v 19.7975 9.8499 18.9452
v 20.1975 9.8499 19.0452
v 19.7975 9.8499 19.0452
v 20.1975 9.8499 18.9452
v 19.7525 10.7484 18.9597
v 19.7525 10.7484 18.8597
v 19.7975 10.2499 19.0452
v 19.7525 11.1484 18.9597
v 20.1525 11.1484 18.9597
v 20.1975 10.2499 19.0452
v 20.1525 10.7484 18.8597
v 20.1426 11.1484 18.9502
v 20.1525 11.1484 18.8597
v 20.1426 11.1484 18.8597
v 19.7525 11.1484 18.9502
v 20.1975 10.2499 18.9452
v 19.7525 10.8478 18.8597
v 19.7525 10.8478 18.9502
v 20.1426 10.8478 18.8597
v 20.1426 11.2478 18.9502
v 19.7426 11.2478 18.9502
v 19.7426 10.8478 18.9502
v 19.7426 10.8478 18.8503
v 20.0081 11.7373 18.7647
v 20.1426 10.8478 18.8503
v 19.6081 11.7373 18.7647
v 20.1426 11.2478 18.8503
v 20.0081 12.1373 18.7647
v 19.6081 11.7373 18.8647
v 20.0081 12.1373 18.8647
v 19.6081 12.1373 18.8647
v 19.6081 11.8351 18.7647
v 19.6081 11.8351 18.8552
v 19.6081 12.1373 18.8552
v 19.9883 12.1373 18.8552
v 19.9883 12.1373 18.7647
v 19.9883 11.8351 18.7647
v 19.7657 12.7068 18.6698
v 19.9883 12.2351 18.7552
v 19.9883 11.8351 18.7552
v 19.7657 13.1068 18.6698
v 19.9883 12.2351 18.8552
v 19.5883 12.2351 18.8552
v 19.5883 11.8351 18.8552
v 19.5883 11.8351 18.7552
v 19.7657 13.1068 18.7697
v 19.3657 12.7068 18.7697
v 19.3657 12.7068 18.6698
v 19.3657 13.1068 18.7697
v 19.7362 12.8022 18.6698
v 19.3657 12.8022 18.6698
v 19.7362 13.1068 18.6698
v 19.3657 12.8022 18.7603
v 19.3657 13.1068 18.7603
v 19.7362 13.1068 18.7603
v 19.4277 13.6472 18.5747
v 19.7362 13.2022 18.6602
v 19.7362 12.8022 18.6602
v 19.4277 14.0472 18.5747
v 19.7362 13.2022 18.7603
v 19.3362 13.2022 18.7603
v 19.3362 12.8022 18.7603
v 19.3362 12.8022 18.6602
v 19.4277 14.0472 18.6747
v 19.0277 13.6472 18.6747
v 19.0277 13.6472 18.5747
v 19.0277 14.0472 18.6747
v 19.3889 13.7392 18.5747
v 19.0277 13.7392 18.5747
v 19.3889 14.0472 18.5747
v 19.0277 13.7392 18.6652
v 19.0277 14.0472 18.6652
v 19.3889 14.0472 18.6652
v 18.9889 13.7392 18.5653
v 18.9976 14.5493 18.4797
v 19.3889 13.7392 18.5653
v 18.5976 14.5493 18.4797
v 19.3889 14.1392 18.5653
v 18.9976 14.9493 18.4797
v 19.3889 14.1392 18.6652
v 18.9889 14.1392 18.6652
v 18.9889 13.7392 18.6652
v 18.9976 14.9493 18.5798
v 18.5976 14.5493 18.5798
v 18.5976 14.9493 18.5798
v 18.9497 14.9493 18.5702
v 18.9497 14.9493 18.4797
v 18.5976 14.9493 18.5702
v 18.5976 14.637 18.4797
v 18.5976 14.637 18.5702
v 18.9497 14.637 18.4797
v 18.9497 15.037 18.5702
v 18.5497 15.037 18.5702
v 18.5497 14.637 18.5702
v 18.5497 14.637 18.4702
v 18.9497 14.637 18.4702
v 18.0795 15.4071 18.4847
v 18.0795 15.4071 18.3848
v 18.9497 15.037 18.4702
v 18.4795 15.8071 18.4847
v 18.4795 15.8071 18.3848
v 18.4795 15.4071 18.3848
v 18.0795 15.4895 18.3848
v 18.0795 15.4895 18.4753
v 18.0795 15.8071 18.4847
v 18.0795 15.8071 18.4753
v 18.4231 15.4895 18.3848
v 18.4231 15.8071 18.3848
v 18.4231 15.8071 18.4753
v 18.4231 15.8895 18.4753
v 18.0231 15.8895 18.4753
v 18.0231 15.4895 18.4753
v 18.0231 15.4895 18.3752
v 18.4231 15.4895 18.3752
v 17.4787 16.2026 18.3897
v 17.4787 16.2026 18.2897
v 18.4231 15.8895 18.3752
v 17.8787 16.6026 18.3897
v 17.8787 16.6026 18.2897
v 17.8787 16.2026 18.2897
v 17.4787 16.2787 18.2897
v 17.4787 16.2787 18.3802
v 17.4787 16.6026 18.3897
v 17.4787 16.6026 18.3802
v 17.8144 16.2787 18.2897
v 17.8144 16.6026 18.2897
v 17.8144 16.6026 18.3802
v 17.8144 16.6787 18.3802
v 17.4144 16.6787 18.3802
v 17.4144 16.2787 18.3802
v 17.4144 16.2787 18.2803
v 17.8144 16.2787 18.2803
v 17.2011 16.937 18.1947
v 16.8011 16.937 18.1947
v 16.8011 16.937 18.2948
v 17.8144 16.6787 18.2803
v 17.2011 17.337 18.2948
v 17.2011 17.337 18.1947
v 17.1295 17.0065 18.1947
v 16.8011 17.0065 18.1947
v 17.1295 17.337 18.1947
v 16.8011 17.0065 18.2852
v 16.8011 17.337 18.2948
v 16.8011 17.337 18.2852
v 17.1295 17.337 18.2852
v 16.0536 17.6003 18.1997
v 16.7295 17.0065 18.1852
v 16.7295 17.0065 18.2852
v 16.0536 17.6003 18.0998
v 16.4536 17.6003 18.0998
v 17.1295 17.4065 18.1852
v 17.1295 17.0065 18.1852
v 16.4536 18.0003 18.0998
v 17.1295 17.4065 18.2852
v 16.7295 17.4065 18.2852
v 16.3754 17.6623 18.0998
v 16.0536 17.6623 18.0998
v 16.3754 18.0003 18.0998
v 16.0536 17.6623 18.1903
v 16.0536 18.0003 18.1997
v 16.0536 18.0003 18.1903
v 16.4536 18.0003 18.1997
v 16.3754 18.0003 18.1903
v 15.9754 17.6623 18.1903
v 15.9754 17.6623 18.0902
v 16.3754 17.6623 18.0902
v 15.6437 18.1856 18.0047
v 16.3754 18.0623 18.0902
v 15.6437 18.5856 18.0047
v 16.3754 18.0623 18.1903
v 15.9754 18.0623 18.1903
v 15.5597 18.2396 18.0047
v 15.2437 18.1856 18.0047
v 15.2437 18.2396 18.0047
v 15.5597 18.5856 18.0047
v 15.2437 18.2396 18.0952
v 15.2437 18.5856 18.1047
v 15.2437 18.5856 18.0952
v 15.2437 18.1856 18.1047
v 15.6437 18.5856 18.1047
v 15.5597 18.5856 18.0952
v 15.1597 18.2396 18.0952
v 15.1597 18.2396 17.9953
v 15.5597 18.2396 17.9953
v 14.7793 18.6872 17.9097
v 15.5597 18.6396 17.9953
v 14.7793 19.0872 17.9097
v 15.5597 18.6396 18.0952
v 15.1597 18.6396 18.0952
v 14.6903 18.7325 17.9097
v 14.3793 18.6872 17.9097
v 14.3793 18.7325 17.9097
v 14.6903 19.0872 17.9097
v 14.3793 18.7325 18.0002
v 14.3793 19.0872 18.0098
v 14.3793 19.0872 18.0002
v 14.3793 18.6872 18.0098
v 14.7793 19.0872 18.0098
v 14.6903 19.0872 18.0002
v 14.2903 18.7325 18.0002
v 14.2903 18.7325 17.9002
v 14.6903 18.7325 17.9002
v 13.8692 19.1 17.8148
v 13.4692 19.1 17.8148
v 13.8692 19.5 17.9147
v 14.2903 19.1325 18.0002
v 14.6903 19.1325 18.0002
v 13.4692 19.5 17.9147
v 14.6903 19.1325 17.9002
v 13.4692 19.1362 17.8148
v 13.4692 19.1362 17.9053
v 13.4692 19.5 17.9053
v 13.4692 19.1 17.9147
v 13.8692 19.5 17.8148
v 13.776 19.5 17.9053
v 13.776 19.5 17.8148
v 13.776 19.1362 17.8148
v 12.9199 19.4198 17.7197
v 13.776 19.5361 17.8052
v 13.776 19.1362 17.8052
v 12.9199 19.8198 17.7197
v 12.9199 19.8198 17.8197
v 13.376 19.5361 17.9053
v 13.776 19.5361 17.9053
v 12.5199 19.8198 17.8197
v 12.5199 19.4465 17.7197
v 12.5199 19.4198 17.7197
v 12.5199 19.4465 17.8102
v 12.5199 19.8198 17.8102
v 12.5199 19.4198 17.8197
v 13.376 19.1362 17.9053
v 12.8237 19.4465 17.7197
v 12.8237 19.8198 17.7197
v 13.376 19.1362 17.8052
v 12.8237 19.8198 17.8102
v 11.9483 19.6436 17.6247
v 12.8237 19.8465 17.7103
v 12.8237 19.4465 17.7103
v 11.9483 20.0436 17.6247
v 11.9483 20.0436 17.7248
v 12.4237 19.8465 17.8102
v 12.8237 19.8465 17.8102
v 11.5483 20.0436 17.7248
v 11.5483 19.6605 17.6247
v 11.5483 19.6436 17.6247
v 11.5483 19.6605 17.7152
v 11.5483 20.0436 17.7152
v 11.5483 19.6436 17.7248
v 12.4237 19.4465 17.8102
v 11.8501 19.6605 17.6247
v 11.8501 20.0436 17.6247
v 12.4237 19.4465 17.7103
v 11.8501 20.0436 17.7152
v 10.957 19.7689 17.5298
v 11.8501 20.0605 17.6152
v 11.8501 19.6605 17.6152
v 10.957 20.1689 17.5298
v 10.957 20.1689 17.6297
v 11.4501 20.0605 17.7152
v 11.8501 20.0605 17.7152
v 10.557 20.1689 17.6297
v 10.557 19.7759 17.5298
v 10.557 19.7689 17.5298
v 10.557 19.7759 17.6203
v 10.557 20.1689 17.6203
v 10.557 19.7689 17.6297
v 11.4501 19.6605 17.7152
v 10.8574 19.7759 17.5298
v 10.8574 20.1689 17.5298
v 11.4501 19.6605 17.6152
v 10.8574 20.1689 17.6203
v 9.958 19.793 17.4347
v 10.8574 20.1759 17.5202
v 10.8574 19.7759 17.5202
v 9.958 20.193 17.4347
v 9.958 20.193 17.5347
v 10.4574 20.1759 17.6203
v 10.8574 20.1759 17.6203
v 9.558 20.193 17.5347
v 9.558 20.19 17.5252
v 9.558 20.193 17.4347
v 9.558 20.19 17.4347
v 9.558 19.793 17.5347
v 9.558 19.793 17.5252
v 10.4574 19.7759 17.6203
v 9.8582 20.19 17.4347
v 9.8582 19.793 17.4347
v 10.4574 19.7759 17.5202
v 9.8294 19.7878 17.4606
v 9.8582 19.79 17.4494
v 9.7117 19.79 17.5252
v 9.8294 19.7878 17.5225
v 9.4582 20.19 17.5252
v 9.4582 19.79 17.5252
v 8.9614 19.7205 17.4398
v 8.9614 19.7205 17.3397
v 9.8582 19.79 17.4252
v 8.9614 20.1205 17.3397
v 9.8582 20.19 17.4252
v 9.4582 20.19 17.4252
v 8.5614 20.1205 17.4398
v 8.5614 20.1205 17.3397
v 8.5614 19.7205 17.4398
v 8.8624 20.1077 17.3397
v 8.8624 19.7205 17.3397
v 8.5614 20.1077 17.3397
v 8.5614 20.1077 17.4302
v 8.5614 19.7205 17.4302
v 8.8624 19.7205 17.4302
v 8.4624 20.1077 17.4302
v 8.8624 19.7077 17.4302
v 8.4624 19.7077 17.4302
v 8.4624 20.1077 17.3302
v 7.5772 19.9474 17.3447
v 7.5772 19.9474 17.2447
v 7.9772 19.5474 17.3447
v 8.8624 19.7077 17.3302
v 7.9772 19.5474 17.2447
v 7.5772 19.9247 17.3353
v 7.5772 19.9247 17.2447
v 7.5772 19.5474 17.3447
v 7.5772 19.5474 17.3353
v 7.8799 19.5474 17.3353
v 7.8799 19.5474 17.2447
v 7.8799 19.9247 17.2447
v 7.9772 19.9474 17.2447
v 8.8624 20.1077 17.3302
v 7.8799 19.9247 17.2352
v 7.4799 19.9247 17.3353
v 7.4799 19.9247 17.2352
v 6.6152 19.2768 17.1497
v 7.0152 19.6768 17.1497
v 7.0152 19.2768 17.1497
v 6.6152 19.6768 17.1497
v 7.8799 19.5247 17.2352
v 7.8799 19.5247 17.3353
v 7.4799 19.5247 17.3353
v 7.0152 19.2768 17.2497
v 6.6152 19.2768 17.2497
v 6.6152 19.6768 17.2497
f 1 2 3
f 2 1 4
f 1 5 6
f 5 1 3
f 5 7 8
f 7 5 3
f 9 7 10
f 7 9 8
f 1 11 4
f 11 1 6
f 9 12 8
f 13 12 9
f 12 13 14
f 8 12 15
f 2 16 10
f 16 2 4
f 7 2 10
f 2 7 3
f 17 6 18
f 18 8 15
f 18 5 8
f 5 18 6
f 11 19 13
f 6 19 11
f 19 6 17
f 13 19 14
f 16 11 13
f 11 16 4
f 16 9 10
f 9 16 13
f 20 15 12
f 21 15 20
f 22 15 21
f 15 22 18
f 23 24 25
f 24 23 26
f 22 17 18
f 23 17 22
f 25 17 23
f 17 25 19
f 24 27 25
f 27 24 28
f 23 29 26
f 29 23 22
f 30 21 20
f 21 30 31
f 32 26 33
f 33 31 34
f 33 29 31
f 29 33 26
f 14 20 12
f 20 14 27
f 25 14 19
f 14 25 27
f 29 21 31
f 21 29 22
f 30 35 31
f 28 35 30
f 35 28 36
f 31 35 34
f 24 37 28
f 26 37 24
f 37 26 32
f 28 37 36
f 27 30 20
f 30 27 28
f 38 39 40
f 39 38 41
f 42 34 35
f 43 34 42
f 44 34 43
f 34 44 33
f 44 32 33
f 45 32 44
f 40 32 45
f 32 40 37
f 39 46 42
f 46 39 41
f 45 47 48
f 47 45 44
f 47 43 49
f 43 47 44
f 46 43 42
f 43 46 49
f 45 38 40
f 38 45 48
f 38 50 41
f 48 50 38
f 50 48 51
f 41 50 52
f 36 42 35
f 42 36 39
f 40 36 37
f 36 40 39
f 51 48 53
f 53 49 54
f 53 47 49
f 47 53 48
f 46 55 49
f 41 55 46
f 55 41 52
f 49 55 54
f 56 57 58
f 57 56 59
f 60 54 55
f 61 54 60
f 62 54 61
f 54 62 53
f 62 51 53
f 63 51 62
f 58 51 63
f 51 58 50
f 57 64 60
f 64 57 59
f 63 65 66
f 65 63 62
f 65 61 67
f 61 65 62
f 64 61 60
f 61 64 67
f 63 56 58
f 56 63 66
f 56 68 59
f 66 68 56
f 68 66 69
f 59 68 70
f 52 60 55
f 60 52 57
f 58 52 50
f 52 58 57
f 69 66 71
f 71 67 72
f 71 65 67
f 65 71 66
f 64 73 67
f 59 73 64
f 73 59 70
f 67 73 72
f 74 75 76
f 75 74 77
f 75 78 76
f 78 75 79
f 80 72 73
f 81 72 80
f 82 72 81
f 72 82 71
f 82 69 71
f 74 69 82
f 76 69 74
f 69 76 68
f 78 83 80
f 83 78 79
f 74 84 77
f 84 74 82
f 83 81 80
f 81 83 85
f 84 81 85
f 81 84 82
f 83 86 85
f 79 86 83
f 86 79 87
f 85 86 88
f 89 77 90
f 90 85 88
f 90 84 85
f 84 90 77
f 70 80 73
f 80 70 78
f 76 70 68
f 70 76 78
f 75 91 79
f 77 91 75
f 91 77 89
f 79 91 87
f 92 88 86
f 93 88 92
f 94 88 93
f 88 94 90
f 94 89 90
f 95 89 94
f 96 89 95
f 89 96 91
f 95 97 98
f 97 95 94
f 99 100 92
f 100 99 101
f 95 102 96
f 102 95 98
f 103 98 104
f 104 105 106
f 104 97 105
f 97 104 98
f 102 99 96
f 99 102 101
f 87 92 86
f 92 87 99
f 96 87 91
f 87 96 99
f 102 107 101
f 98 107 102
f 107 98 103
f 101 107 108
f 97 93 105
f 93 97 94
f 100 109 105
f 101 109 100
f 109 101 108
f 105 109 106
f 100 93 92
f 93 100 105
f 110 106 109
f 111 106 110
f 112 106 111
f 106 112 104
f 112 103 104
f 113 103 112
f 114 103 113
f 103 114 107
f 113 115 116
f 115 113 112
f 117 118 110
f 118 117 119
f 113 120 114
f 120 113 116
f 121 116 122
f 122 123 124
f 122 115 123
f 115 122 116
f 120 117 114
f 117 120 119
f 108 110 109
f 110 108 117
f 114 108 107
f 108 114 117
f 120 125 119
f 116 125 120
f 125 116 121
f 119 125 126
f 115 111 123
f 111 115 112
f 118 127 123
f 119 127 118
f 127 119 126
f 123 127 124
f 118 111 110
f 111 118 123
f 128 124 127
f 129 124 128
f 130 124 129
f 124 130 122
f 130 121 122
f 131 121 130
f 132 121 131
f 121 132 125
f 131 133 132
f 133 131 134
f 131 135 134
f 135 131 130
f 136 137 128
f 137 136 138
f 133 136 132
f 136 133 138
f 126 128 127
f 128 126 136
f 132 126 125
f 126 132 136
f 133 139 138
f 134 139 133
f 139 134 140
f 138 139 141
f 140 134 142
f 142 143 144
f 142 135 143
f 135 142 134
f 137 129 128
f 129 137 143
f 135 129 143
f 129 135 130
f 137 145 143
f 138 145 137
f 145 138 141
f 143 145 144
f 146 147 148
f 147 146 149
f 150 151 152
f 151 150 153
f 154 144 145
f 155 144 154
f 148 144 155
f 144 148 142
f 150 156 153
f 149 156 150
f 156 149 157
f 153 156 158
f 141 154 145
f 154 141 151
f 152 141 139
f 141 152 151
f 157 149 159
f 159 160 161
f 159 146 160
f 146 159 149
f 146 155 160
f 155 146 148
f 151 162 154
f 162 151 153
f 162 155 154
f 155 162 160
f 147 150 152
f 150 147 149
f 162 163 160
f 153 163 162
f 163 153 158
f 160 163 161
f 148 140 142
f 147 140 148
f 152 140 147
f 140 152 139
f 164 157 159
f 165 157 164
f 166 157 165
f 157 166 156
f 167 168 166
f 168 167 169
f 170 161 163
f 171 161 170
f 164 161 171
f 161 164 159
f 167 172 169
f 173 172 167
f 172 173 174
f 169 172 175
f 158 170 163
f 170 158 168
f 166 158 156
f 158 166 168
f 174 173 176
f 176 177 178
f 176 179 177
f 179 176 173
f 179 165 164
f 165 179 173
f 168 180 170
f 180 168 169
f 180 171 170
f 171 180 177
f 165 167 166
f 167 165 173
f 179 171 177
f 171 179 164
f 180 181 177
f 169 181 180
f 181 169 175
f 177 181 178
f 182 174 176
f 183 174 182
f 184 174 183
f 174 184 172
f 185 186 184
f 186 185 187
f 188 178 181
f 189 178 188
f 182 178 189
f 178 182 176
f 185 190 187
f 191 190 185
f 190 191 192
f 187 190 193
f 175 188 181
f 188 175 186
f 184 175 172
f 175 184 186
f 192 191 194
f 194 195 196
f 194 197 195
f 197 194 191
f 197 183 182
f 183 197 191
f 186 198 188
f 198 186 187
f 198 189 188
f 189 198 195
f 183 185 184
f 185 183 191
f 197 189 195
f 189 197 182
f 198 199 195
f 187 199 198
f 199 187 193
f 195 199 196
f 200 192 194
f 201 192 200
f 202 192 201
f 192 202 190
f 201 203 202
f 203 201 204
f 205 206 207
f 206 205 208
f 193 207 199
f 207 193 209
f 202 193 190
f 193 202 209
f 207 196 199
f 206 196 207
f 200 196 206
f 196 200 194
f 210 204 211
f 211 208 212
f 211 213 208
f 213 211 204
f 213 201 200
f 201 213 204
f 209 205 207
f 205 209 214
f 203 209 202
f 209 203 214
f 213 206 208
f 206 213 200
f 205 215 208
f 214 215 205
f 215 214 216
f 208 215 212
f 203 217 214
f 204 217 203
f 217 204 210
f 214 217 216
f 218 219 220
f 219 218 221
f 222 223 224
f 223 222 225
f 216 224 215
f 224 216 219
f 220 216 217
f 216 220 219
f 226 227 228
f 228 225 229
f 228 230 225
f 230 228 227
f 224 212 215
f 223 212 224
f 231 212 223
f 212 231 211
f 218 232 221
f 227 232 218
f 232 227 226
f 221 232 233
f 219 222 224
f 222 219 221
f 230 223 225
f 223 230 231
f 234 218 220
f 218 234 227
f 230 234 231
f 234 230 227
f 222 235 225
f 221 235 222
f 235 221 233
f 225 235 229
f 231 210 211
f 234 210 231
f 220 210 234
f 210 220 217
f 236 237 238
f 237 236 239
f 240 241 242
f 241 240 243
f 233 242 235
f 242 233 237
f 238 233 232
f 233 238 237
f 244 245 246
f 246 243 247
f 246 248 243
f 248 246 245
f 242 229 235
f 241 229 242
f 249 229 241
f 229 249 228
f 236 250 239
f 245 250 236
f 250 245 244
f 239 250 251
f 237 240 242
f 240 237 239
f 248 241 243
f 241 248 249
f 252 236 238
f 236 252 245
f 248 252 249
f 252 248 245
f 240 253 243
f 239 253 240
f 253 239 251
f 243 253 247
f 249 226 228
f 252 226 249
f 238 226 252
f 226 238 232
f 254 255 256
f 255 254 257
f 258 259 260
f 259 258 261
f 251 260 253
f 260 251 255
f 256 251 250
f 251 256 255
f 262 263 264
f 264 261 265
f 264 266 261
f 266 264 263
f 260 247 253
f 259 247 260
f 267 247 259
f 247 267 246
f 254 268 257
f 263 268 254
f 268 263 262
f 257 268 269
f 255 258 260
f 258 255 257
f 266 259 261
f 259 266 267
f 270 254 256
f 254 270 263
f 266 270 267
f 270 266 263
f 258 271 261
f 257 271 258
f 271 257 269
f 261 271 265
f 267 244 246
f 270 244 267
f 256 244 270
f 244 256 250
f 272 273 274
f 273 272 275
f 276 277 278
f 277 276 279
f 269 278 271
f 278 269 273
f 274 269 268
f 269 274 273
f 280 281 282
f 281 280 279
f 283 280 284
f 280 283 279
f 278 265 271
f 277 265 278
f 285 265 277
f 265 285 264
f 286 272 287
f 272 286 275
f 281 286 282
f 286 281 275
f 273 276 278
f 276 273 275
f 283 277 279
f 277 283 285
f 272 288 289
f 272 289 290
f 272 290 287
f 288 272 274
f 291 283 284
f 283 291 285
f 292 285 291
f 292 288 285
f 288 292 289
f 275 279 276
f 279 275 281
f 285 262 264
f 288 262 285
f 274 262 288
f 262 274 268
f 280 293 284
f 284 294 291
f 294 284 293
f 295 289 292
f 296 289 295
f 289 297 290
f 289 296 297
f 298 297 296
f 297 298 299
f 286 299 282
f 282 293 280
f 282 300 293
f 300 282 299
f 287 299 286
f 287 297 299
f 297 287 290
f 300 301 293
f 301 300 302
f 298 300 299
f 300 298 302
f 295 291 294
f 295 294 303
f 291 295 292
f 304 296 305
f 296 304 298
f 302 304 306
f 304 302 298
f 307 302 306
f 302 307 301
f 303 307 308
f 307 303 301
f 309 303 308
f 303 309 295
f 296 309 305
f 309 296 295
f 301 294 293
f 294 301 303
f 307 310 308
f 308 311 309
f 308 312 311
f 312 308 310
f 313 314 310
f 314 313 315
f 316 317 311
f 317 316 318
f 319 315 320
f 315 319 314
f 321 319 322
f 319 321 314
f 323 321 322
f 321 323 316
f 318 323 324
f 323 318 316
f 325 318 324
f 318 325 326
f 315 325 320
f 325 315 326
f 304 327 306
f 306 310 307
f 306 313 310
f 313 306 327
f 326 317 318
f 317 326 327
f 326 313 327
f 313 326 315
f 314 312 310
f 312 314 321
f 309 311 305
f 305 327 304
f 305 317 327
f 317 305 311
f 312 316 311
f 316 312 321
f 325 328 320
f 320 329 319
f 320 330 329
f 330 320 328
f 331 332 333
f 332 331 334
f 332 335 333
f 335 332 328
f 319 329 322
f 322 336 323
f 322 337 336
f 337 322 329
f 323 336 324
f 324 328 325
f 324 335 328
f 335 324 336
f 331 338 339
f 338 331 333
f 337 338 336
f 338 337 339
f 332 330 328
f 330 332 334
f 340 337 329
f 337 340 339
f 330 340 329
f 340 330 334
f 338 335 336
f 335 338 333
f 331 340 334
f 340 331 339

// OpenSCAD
hull() {
    translate([19.997502085, 10.04991671, 18.995250000000002]) cube([0.4, 0.4, 0.1], center=true);
    translate([19.952539615000003, 10.94841749, 18.909750000000003]) cube([0.4, 0.4, 0.1], center=true);
}


hull() {
    translate([19.942572905000002, 11.047752155000001, 18.900250000000003]) cube([0.4, 0.4, 0.1], center=true);
    translate([19.808134595000002, 11.937275345000002, 18.81475]) cube([0.4, 0.4, 0.1], center=true);
}


hull() {
    translate([19.78830075, 12.035118740000001, 18.805249999999997]) cube([0.4, 0.4, 0.1], center=true);
    translate([19.56572985, 12.90677666, 18.719749999999998]) cube([0.4, 0.4, 0.1], center=true);
}


hull() {
    translate([19.536227055, 13.002151165, 18.71025]) cube([0.4, 0.4, 0.1], center=true);
    translate([19.227747645, 13.847234335, 18.624750000000002]) cube([0.4, 0.4, 0.1], center=true);
}


hull() {
    translate([19.188870685, 13.939187, 18.615250000000003]) cube([0.4, 0.4, 0.1], center=true);
    translate([18.797564815, 14.749251800000001, 18.52975]) cube([0.4, 0.4, 0.1], center=true);
}


hull() {
    translate([18.749702125, 14.837035130000002, 18.52025]) cube([0.4, 0.4, 0.1], center=true);
    translate([18.279479575000003, 15.607070270000001, 18.43475]) cube([0.4, 0.4, 0.1], center=true);
}


hull() {
    translate([18.22310939, 15.689466345000001, 18.42525]) cube([0.4, 0.4, 0.1], center=true);
    translate([17.67866861, 16.402560555, 18.33975]) cube([0.4, 0.4, 0.1], center=true);
}


hull() {
    translate([17.614354159999998, 16.4787461, 18.33025]) cube([0.4, 0.4, 0.1], center=true);
    translate([17.001134840000002, 17.1369917, 18.24475]) cube([0.4, 0.4, 0.1], center=true);
}


hull() {
    translate([16.92951873, 17.20654631, 18.23525]) cube([0.4, 0.4, 0.1], center=true);
    translate([16.25364807, 17.80028369, 18.14975]) cube([0.4, 0.4, 0.1], center=true);
}


hull() {
    translate([16.17544587, 17.862341135, 18.14025]) cube([0.4, 0.4, 0.1], center=true);
    translate([15.44367693, 18.385637765, 18.054750000000002]) cube([0.4, 0.4, 0.1], center=true);
}


hull() {
    translate([15.359670150000001, 18.43957799, 18.04525]) cube([0.4, 0.4, 0.1], center=true);
    translate([14.57931705, 18.88720541, 17.959749999999996]) cube([0.4, 0.4, 0.1], center=true);
}


hull() {
    translate([14.49034477, 18.932489465, 17.950249999999997]) cube([0.4, 0.4, 0.1], center=true);
    translate([13.66919683, 19.299975035, 17.86475]) cube([0.4, 0.4, 0.1], center=true);
}


hull() {
    translate([13.576017815, 19.336150449999998, 17.85525]) cube([0.4, 0.4, 0.1], center=true);
    translate([12.719943485, 19.619822349999996, 17.769750000000002]) cube([0.4, 0.4, 0.1], center=true);
}


hull() {
    translate([12.62374818, 19.646527669999998, 17.76025]) cube([0.4, 0.4, 0.1], center=true);
    translate([11.74830702, 19.84355153, 17.674750000000003]) cube([0.4, 0.4, 0.1], center=true);
}


hull() {
    translate([11.650056430000001, 19.86051993, 17.665250000000004]) cube([0.4, 0.4, 0.1], center=true);
    translate([10.75698697, 19.96892727, 17.57975]) cube([0.4, 0.4, 0.1], center=true);
}


hull() {
    translate([10.65740365, 19.975897805, 17.570249999999998]) cube([0.4, 0.4, 0.1], center=true);
    translate([9.75797335, 19.992960095, 17.484750000000002]) cube([0.4, 0.4, 0.1], center=true);
}


hull() {
    translate([9.6581825, 19.990044665, 17.475250000000003]) cube([0.4, 0.4, 0.1], center=true);
    translate([8.761377500000002, 19.920504634999997, 17.389750000000003]) cube([0.4, 0.4, 0.1], center=true);
}


hull() {
    translate([8.662376205000001, 19.907733049999997, 17.38025]) cube([0.4, 0.4, 0.1], center=true);
    translate([7.777157895, 19.74738455, 17.29475]) cube([0.4, 0.4, 0.1], center=true);
}


hull() {
    translate([7.679935565, 19.724702535, 17.28525]) cube([0.4, 0.4, 0.1], center=true);
    translate([6.815151934999999, 19.476774765, 17.19975]) cube([0.4, 0.4, 0.1], center=true);
}
